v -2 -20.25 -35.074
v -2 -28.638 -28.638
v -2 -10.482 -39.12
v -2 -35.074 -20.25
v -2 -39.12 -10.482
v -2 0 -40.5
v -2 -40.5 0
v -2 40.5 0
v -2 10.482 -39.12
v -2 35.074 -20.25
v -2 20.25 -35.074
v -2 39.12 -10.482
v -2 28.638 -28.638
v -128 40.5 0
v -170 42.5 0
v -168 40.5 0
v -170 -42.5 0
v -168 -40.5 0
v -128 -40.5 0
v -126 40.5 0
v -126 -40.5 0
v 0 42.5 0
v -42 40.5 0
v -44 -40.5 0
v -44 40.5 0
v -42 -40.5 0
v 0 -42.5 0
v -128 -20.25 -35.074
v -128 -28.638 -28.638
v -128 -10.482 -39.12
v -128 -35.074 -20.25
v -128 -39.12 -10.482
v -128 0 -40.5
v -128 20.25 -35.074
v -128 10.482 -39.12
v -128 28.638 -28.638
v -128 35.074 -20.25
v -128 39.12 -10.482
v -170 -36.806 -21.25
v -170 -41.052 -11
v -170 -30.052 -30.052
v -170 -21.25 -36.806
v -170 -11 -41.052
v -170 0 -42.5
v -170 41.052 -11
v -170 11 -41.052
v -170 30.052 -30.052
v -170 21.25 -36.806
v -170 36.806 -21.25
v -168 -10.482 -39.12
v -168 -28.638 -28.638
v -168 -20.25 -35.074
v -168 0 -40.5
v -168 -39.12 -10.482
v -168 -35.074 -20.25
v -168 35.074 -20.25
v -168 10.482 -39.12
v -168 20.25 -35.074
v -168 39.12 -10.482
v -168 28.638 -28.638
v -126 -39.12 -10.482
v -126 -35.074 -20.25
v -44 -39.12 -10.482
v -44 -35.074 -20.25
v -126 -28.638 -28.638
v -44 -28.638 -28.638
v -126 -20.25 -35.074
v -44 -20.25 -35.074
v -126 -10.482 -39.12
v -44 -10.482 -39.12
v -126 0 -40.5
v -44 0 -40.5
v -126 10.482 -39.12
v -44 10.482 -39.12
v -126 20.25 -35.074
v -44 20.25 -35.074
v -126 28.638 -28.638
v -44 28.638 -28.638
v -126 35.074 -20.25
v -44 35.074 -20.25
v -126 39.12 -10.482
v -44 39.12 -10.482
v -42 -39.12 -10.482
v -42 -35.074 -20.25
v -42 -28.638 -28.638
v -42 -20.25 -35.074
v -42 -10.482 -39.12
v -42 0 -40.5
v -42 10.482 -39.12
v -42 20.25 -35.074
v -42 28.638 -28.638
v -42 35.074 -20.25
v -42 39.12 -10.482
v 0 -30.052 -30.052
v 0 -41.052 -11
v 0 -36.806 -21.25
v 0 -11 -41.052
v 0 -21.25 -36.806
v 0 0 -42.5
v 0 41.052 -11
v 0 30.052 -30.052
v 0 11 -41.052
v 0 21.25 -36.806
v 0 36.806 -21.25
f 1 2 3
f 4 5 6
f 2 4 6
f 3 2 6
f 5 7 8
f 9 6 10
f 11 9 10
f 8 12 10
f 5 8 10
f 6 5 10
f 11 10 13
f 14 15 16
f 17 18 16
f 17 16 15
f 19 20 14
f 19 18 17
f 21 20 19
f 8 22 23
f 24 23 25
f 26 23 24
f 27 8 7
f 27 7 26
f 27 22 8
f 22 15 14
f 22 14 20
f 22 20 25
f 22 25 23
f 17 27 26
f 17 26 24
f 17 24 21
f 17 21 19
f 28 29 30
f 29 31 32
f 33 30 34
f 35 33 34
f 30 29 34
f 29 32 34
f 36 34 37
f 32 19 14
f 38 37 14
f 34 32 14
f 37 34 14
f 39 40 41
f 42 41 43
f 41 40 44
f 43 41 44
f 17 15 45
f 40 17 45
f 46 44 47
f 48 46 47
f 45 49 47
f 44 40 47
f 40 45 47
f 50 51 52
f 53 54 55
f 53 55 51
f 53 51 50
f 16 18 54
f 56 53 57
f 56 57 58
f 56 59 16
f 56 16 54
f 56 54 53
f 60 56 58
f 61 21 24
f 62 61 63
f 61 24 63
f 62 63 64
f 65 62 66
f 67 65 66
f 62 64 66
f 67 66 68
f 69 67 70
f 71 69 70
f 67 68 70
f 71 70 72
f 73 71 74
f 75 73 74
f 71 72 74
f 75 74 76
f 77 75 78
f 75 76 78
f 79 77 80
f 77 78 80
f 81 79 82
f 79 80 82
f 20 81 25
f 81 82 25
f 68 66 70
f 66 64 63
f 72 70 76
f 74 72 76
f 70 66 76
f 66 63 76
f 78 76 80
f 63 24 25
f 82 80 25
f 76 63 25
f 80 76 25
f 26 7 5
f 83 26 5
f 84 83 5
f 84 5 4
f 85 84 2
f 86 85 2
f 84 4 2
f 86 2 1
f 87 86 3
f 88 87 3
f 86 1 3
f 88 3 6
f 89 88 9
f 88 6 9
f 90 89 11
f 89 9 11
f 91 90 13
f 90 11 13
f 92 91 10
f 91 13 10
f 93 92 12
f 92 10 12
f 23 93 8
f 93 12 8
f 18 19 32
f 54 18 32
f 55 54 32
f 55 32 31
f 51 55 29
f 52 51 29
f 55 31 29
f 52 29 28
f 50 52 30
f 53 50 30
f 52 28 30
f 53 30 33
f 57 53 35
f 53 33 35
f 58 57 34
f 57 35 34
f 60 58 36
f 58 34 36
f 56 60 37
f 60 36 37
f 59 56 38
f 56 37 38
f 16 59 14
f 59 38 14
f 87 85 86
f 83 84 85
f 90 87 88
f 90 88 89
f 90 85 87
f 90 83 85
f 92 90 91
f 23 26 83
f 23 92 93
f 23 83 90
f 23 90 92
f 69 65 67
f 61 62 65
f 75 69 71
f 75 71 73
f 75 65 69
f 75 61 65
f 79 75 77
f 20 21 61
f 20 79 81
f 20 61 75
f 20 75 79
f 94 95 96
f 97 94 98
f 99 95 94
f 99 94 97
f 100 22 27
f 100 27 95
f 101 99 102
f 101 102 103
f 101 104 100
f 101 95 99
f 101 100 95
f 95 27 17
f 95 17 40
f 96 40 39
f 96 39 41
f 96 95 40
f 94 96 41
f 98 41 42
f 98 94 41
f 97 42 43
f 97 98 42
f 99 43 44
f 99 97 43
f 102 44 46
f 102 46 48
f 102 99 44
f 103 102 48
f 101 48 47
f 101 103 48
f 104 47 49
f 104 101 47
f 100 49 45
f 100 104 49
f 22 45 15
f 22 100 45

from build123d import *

# Parameters (mm, degrees)
PROFILE_EXTRUDE_DEPTH = 170
PROFILE_SHELL_T       = -2
SUPPORT_EXTRUDE_REACH = 182.312
SUPPORT_SKETCH_W      = 2
SUPPORT_SKETCH_H      = 81


with BuildPart() as part:
    # Profile Sketch → Profile Extrude (new body)
    with BuildSketch(Plane(origin=(0, 0, 0), x_dir=(0, 0, -1), z_dir=(1, 0, 0))):
        with BuildLine():
            Line((0, 42.5), (0, -42.5))
            ThreePointArc((0, -42.5), (42.5, 0), (0, 42.5))
        make_face()
    extrude(amount=-PROFILE_EXTRUDE_DEPTH)

    # Profile Shell
    profile_shell_openings = [part.faces().sort_by_distance(p)[0] for p in [
        (-85, 0, 0),
    ]]
    offset(amount=PROFILE_SHELL_T, openings=profile_shell_openings)

    # Support Sketch → Support Extrude (add, up to next)
    with BuildSketch(Plane.XY, mode=Mode.PRIVATE) as support_extrude_sk1:
        with Locations((-127, 0)):
            Rectangle(SUPPORT_SKETCH_W, SUPPORT_SKETCH_H)
    support_extrude_tool1 = extrude(support_extrude_sk1.sketch, amount=-SUPPORT_EXTRUDE_REACH, mode=Mode.PRIVATE) - part.part
    # Support Sketch → Support Extrude (add, up to next)
    with BuildSketch(Plane.XY, mode=Mode.PRIVATE) as support_extrude_sk2:
        with Locations((-43, 0)):
            Rectangle(SUPPORT_SKETCH_W, SUPPORT_SKETCH_H)
    support_extrude_tool2 = extrude(support_extrude_sk2.sketch, amount=-SUPPORT_EXTRUDE_REACH, mode=Mode.PRIVATE) - part.part
    add(support_extrude_tool1.solids().sort_by_distance((-127, 0, 0))[0])
    add(support_extrude_tool2.solids().sort_by_distance((-43, 0, 0))[0])


solid = part.part
